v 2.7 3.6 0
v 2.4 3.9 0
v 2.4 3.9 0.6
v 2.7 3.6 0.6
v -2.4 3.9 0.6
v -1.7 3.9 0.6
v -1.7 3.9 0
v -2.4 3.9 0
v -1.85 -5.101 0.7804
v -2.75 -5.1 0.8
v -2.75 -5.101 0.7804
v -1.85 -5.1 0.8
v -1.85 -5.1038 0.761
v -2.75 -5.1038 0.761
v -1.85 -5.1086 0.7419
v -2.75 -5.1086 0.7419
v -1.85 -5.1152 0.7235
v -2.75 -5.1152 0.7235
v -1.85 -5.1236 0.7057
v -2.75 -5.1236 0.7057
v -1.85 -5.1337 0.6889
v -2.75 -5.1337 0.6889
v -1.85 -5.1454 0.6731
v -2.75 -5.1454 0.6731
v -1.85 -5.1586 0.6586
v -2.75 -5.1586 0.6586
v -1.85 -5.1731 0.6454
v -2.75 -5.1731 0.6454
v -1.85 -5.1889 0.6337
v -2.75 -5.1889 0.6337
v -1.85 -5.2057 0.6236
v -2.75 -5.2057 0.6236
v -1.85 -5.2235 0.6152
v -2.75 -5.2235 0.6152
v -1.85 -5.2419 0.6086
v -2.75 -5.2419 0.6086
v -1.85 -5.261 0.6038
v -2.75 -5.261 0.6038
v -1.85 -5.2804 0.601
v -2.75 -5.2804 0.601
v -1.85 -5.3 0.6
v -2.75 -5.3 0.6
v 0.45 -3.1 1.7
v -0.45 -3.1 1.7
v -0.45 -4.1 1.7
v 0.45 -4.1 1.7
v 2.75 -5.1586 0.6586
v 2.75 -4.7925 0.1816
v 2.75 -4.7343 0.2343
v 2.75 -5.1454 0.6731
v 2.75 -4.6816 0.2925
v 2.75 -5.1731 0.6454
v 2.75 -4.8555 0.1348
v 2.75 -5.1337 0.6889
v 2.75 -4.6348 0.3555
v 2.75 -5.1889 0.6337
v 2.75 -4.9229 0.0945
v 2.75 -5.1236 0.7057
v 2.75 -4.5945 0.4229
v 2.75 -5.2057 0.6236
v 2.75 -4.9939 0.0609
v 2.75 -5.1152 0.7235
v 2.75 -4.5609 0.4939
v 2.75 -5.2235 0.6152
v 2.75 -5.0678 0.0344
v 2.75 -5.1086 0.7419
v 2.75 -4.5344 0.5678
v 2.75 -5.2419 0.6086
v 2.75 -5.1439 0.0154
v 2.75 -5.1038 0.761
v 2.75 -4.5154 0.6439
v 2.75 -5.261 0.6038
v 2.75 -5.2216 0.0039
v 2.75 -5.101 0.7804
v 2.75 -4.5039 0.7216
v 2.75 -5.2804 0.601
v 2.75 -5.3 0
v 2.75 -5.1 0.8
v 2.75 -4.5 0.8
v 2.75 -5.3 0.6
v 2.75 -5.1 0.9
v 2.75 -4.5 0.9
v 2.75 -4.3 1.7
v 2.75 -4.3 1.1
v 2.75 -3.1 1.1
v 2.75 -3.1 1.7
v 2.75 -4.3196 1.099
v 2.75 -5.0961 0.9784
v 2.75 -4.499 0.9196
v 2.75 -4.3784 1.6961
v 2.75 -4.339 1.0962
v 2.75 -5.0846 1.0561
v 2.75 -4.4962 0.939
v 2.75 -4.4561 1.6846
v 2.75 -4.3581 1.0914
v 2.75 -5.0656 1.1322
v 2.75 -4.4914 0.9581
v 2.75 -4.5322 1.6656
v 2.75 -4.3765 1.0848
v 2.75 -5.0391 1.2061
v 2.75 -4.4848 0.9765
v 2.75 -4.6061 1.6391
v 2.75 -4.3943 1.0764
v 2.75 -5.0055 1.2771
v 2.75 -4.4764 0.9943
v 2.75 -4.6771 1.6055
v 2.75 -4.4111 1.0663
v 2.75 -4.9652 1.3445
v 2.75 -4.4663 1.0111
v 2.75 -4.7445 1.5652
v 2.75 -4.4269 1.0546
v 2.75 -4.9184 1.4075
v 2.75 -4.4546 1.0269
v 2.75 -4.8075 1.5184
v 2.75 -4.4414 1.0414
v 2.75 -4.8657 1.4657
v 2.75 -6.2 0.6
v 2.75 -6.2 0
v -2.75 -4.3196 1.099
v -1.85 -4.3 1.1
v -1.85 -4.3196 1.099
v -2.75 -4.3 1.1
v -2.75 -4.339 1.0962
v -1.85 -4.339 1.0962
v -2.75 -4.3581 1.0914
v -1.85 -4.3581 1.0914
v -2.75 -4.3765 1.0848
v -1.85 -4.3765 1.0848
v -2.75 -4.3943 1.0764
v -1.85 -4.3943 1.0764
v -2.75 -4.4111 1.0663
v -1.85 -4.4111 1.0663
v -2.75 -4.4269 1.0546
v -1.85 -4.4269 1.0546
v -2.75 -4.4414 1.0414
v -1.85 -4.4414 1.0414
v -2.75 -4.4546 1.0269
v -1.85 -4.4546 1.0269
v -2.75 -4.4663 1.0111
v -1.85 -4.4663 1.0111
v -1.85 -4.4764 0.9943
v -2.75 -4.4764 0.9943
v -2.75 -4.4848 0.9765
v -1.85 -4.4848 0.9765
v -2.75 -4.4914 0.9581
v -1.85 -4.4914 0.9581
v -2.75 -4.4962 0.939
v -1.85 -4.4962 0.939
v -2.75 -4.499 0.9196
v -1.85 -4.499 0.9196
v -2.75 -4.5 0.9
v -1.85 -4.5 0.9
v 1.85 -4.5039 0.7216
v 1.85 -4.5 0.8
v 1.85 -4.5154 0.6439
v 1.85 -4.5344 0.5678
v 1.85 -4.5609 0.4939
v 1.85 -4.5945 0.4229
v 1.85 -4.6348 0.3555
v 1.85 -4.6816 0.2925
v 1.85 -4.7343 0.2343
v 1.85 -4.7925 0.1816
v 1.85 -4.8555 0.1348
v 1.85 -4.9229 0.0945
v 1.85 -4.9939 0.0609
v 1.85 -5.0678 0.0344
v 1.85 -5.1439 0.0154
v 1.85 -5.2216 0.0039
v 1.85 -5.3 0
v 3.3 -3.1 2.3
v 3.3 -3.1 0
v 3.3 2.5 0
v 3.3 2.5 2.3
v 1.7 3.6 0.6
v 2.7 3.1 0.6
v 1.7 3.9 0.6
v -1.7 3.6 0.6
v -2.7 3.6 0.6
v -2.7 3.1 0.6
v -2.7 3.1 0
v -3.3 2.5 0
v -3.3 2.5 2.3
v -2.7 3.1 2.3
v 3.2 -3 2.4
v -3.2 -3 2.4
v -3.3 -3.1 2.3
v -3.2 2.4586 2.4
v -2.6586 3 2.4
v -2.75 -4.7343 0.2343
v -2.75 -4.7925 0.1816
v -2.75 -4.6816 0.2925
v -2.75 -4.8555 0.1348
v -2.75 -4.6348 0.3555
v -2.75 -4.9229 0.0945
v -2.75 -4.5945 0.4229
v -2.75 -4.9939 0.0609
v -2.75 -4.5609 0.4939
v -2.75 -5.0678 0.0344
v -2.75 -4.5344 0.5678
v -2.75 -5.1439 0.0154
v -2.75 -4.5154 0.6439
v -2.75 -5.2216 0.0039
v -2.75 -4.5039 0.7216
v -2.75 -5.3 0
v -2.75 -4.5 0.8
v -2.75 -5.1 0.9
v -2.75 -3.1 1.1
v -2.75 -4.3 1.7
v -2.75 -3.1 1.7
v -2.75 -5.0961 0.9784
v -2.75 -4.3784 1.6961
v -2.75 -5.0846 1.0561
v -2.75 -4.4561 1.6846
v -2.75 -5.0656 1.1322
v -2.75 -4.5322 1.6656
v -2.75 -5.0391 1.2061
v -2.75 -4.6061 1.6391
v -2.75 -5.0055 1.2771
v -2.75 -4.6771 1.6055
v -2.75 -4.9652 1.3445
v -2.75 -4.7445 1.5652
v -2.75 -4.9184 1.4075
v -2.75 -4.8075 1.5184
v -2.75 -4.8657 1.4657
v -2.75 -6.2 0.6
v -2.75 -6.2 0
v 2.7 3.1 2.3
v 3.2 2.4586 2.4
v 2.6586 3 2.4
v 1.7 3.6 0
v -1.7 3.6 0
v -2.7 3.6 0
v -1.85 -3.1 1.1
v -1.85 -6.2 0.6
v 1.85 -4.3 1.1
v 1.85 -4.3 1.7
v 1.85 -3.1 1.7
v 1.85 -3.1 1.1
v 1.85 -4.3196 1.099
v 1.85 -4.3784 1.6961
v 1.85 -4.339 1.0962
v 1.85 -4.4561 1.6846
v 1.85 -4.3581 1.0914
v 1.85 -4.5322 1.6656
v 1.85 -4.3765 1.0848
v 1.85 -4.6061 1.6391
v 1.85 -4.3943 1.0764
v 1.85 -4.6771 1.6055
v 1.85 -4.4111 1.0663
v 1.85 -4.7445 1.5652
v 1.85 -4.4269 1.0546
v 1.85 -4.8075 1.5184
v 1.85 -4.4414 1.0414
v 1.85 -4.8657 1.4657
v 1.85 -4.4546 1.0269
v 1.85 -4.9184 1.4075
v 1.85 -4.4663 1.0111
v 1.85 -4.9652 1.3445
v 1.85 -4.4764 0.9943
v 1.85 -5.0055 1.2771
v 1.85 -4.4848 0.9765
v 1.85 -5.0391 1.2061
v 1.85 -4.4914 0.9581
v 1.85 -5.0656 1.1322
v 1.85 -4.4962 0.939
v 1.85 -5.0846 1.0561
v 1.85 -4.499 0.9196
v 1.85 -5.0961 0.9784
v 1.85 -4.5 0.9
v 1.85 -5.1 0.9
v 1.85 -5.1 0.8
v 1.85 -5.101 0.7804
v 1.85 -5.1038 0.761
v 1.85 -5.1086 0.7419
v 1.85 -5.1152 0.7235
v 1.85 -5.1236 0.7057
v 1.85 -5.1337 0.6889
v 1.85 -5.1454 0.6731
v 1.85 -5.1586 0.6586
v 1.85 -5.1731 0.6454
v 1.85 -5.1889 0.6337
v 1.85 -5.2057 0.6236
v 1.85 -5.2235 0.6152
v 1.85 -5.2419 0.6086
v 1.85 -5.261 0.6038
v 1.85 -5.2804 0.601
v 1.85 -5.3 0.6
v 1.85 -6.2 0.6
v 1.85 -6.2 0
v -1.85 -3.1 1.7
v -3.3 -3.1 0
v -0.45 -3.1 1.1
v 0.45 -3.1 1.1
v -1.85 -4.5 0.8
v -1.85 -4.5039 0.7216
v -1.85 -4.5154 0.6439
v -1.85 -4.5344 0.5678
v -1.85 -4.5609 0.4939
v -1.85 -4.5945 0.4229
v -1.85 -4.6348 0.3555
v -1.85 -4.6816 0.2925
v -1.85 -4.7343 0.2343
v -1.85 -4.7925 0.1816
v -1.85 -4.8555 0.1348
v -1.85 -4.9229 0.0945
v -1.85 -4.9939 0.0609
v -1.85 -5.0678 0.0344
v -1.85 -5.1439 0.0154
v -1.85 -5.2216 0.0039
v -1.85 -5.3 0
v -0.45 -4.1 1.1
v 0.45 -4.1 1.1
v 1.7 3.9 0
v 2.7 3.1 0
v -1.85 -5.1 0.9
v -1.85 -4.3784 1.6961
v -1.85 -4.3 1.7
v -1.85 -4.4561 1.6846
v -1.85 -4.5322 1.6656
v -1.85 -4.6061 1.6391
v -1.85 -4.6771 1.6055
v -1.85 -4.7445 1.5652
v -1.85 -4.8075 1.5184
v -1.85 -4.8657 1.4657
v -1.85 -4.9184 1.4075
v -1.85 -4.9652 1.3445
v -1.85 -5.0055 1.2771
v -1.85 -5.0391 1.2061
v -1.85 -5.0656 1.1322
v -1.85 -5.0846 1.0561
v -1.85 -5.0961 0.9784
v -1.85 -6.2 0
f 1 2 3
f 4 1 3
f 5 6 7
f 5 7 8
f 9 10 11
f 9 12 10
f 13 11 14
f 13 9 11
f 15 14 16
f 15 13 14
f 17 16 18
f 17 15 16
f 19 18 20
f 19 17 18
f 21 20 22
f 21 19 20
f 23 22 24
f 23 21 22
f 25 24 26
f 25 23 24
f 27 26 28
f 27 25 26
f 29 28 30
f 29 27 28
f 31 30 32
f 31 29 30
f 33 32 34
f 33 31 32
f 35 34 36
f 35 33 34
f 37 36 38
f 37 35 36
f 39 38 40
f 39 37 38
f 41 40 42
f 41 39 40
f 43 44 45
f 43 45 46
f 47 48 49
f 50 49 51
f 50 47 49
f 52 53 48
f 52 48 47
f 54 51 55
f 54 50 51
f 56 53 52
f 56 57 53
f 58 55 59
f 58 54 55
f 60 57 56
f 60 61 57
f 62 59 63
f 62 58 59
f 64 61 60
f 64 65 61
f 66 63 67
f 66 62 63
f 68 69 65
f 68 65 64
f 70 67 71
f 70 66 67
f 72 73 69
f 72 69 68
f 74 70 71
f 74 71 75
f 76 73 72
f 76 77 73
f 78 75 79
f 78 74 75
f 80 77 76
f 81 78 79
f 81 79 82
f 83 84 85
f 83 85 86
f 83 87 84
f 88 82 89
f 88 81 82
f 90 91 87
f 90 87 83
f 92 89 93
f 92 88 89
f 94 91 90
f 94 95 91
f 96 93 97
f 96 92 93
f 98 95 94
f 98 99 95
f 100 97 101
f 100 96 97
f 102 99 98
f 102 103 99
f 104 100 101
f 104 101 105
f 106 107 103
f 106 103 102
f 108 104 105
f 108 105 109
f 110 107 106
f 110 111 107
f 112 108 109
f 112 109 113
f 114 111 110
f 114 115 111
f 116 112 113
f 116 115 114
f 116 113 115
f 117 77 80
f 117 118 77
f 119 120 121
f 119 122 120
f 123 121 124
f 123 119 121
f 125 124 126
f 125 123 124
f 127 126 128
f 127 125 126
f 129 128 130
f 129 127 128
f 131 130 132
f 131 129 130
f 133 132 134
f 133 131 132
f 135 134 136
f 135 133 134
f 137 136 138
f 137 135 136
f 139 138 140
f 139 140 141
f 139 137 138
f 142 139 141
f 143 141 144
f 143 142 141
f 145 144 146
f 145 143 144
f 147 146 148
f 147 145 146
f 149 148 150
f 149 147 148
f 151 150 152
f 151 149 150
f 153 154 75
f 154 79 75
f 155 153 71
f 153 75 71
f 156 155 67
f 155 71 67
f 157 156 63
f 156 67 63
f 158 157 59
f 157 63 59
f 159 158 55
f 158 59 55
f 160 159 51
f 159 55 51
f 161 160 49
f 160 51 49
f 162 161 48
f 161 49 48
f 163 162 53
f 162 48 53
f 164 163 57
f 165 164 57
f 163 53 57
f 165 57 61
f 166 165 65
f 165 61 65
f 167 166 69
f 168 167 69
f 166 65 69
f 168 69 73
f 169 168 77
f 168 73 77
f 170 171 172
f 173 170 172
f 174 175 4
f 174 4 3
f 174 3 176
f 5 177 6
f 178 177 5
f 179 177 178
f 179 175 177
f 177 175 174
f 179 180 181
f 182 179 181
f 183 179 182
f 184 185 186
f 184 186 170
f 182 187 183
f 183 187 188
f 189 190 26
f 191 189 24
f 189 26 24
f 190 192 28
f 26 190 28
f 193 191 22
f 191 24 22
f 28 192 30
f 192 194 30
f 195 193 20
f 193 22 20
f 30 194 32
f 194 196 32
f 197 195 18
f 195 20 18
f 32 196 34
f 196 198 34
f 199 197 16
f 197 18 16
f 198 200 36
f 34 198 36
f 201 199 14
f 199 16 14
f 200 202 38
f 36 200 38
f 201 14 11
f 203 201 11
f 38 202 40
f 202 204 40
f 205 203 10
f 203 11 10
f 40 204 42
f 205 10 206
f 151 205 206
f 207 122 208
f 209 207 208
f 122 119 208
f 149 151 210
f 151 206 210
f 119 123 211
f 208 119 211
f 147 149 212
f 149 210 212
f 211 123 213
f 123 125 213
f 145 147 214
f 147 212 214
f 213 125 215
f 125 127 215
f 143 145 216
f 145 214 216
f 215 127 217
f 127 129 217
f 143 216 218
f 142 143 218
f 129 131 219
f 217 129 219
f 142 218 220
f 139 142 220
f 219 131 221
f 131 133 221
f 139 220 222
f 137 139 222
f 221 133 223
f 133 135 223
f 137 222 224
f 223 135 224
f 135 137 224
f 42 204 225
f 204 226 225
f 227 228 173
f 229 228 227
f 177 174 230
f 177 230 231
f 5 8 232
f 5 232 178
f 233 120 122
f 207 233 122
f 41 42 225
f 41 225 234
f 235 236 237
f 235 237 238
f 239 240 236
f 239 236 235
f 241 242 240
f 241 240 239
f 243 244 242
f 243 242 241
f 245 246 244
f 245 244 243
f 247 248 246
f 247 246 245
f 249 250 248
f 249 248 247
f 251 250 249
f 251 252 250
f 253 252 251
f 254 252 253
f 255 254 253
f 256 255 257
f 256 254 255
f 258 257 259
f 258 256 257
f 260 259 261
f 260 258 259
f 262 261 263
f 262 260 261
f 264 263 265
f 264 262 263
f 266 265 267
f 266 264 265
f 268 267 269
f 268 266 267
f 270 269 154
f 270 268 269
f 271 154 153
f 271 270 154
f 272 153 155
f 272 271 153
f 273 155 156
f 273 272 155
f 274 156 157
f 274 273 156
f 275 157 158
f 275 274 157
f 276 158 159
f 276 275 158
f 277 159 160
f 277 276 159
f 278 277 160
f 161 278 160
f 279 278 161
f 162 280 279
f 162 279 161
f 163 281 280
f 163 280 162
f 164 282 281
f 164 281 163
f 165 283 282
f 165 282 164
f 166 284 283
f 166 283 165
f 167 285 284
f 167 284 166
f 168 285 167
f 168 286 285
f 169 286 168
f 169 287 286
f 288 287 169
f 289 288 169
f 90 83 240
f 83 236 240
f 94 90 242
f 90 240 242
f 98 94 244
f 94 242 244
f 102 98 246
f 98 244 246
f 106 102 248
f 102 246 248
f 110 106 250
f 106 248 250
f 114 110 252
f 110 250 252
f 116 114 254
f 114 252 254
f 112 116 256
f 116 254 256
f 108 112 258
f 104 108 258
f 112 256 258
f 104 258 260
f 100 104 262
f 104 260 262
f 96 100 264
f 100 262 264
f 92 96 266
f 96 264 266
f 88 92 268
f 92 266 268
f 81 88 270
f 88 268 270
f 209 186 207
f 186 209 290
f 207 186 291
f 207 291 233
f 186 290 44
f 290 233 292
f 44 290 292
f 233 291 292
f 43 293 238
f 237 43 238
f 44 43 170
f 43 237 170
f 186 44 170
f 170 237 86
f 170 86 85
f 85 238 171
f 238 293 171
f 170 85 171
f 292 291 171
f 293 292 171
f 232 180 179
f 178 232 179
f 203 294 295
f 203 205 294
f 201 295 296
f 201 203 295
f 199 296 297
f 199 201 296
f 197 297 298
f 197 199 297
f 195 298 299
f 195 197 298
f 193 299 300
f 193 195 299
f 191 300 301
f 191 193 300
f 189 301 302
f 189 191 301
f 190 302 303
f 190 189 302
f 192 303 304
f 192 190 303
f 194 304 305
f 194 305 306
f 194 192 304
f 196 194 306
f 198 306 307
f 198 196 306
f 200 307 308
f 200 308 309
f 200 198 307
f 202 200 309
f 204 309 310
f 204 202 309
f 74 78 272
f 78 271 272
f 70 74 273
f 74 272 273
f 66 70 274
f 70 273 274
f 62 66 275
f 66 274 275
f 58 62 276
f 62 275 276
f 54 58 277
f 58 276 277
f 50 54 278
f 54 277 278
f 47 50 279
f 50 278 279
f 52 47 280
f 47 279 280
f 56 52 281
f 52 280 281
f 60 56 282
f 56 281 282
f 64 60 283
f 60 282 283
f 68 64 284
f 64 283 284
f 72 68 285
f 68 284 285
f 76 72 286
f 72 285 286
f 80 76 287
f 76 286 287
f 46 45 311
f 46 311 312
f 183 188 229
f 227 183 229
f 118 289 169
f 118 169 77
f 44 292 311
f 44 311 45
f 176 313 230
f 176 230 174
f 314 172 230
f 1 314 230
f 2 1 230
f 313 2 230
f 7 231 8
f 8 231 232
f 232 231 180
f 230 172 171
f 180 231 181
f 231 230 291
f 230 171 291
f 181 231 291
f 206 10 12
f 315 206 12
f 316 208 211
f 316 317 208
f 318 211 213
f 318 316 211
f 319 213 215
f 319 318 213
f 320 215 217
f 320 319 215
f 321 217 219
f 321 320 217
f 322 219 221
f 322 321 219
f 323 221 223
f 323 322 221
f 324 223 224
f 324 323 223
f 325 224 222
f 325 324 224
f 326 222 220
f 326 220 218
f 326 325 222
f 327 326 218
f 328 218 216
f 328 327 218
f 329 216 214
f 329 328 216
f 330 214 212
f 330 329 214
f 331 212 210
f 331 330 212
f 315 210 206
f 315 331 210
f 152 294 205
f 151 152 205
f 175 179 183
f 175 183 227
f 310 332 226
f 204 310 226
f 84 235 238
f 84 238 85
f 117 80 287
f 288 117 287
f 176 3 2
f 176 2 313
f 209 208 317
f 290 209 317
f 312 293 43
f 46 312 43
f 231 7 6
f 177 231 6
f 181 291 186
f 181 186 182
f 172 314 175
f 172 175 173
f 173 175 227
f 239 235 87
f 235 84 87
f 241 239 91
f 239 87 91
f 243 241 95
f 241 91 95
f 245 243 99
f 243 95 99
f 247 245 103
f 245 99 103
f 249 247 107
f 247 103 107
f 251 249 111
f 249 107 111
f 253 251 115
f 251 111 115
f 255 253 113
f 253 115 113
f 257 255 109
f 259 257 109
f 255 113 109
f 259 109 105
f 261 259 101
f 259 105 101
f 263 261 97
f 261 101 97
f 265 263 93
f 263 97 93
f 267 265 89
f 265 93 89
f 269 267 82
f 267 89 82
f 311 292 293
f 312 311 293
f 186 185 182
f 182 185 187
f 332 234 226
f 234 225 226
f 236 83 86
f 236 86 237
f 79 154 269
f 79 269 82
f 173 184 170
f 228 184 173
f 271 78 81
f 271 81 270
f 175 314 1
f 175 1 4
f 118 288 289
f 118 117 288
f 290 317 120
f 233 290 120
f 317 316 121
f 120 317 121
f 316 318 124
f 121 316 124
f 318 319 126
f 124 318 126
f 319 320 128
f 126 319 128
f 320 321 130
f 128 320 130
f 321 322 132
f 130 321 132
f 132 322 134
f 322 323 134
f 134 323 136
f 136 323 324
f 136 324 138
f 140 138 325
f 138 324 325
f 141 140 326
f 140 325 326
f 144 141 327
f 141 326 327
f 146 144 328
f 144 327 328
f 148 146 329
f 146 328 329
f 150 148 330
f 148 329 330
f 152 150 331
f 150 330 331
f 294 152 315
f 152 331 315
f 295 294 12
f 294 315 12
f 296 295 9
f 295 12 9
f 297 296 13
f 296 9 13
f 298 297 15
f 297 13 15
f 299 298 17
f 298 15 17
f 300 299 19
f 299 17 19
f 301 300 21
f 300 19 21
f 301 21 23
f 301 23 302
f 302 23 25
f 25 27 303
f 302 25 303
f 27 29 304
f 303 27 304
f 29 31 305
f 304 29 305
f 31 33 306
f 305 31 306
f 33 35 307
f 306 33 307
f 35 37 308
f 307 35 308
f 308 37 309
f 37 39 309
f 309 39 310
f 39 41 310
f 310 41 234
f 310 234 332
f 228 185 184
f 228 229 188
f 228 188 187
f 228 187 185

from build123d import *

# Parameters (mm, degrees)
SKIZZE1_W                       = 6.6
SKIZZE1_H                       = 6.2
LINEAR_AUSTRAGEN1_DEPTH         = 2.4
FASE2_SIZE                      = 0.6
SKIZZE2_W                       = 0.9
SKIZZE2_H                       = 0.6
SKIZZE3_W                       = 0.9
SKIZZE3_H                       = 0.6
LINEAR_AUSTRAGEN2_DEPTH         = 1
SKIZZE4_W                       = 5.4
SKIZZE4_H                       = 0.6
LINEAR_AUSTRAGEN3_DEPTH         = 0.8
SKIZZE5_W                       = 3.4
SKIZZE5_H                       = 0.6
SCHNITT_LINEAR_AUSTRAGEN1_DEPTH = 0.3
FASE3_SIZE                      = 0.3
FASE4_SIZE                      = 0.1


with BuildPart() as part:
    # Skizze1 → Linear austragen1 (new body)
    with BuildSketch(Plane.XY):
        Rectangle(SKIZZE1_W, SKIZZE1_H)
    extrude(amount=LINEAR_AUSTRAGEN1_DEPTH)

    # Fase2
    fase2_edges = [part.edges().sort_by_distance(p)[0] for p in [
        (-3.3, 3.1, 1.2),
        (3.3, 3.1, 1.2),
    ]]
    chamfer(fase2_edges, length=FASE2_SIZE)

    # Austragung1: sweep along a curve in space
    with BuildLine() as austragung1_path:
        Line((2.3, -3.1, 1.4), (2.3, -4.3, 1.4))
        ThreePointArc((2.3, -4.3, 1.4), (2.3, -4.653553391, 1.253553391), (2.3, -4.8, 0.9))
        Line((2.3, -4.8, 0.9), (2.3, -4.8, 0.8))
        ThreePointArc((2.3, -4.8, 0.8), (2.3, -4.946446609, 0.446446609), (2.3, -5.3, 0.3))
        Line((2.3, -5.3, 0.3), (2.3, -6.2, 0.3))
    # Skizze2 → Austragung1 (sweep)
    with BuildSketch(Plane.XZ.offset(3.1)):
        with Locations((2.3, 1.4)):
            Rectangle(SKIZZE2_W, SKIZZE2_H)
    austragung1 = sweep(path=austragung1_path.line)

    # Spiegeln1: Austragung1 across plane
    add(austragung1.mirror(Plane(origin=(0, 0, 0), x_dir=(0, 0, 1), z_dir=(1, 0, 0))))

    # Skizze3 → Linear austragen2 (add)
    with BuildSketch(Plane.XZ.offset(3.1)):
        with Locations((0, 1.4)):
            Rectangle(SKIZZE3_W, SKIZZE3_H)
    extrude(amount=LINEAR_AUSTRAGEN2_DEPTH)

    # Skizze4 → Linear austragen3 (add)
    with BuildSketch(Plane(origin=(0, 3.1, 0), x_dir=(-1, 0, 0), z_dir=(0, 1, 0))):
        with Locations((0, 0.3)):
            Rectangle(SKIZZE4_W, SKIZZE4_H)
    extrude(amount=LINEAR_AUSTRAGEN3_DEPTH)

    # Skizze5 → Schnitt-Linear austragen1 (cut)
    with BuildSketch(Plane(origin=(0, 3.9, 0), x_dir=(-1, 0, 0), z_dir=(0, 1, 0))):
        with Locations((0, 0.3)):
            Rectangle(SKIZZE5_W, SKIZZE5_H)
    extrude(amount=-SCHNITT_LINEAR_AUSTRAGEN1_DEPTH, mode=Mode.SUBTRACT)

    # Fase3
    fase3_edges = [part.edges().sort_by_distance(p)[0] for p in [
        (-2.7, 3.9, 0.3),
        (2.7, 3.9, 0.3),
    ]]
    chamfer(fase3_edges, length=FASE3_SIZE)

    # Fase4
    fase4_edges = [part.edges().sort_by_distance(p)[0] for p in [
        (0, -3.1, 2.4),
        (-3.3, -0.3, 2.4),
        (-3, 2.8, 2.4),
        (0, 3.1, 2.4),
        (3, 2.8, 2.4),
        (3.3, -0.3, 2.4),
    ]]
    chamfer(fase4_edges, length=FASE4_SIZE)


solid = part.part
